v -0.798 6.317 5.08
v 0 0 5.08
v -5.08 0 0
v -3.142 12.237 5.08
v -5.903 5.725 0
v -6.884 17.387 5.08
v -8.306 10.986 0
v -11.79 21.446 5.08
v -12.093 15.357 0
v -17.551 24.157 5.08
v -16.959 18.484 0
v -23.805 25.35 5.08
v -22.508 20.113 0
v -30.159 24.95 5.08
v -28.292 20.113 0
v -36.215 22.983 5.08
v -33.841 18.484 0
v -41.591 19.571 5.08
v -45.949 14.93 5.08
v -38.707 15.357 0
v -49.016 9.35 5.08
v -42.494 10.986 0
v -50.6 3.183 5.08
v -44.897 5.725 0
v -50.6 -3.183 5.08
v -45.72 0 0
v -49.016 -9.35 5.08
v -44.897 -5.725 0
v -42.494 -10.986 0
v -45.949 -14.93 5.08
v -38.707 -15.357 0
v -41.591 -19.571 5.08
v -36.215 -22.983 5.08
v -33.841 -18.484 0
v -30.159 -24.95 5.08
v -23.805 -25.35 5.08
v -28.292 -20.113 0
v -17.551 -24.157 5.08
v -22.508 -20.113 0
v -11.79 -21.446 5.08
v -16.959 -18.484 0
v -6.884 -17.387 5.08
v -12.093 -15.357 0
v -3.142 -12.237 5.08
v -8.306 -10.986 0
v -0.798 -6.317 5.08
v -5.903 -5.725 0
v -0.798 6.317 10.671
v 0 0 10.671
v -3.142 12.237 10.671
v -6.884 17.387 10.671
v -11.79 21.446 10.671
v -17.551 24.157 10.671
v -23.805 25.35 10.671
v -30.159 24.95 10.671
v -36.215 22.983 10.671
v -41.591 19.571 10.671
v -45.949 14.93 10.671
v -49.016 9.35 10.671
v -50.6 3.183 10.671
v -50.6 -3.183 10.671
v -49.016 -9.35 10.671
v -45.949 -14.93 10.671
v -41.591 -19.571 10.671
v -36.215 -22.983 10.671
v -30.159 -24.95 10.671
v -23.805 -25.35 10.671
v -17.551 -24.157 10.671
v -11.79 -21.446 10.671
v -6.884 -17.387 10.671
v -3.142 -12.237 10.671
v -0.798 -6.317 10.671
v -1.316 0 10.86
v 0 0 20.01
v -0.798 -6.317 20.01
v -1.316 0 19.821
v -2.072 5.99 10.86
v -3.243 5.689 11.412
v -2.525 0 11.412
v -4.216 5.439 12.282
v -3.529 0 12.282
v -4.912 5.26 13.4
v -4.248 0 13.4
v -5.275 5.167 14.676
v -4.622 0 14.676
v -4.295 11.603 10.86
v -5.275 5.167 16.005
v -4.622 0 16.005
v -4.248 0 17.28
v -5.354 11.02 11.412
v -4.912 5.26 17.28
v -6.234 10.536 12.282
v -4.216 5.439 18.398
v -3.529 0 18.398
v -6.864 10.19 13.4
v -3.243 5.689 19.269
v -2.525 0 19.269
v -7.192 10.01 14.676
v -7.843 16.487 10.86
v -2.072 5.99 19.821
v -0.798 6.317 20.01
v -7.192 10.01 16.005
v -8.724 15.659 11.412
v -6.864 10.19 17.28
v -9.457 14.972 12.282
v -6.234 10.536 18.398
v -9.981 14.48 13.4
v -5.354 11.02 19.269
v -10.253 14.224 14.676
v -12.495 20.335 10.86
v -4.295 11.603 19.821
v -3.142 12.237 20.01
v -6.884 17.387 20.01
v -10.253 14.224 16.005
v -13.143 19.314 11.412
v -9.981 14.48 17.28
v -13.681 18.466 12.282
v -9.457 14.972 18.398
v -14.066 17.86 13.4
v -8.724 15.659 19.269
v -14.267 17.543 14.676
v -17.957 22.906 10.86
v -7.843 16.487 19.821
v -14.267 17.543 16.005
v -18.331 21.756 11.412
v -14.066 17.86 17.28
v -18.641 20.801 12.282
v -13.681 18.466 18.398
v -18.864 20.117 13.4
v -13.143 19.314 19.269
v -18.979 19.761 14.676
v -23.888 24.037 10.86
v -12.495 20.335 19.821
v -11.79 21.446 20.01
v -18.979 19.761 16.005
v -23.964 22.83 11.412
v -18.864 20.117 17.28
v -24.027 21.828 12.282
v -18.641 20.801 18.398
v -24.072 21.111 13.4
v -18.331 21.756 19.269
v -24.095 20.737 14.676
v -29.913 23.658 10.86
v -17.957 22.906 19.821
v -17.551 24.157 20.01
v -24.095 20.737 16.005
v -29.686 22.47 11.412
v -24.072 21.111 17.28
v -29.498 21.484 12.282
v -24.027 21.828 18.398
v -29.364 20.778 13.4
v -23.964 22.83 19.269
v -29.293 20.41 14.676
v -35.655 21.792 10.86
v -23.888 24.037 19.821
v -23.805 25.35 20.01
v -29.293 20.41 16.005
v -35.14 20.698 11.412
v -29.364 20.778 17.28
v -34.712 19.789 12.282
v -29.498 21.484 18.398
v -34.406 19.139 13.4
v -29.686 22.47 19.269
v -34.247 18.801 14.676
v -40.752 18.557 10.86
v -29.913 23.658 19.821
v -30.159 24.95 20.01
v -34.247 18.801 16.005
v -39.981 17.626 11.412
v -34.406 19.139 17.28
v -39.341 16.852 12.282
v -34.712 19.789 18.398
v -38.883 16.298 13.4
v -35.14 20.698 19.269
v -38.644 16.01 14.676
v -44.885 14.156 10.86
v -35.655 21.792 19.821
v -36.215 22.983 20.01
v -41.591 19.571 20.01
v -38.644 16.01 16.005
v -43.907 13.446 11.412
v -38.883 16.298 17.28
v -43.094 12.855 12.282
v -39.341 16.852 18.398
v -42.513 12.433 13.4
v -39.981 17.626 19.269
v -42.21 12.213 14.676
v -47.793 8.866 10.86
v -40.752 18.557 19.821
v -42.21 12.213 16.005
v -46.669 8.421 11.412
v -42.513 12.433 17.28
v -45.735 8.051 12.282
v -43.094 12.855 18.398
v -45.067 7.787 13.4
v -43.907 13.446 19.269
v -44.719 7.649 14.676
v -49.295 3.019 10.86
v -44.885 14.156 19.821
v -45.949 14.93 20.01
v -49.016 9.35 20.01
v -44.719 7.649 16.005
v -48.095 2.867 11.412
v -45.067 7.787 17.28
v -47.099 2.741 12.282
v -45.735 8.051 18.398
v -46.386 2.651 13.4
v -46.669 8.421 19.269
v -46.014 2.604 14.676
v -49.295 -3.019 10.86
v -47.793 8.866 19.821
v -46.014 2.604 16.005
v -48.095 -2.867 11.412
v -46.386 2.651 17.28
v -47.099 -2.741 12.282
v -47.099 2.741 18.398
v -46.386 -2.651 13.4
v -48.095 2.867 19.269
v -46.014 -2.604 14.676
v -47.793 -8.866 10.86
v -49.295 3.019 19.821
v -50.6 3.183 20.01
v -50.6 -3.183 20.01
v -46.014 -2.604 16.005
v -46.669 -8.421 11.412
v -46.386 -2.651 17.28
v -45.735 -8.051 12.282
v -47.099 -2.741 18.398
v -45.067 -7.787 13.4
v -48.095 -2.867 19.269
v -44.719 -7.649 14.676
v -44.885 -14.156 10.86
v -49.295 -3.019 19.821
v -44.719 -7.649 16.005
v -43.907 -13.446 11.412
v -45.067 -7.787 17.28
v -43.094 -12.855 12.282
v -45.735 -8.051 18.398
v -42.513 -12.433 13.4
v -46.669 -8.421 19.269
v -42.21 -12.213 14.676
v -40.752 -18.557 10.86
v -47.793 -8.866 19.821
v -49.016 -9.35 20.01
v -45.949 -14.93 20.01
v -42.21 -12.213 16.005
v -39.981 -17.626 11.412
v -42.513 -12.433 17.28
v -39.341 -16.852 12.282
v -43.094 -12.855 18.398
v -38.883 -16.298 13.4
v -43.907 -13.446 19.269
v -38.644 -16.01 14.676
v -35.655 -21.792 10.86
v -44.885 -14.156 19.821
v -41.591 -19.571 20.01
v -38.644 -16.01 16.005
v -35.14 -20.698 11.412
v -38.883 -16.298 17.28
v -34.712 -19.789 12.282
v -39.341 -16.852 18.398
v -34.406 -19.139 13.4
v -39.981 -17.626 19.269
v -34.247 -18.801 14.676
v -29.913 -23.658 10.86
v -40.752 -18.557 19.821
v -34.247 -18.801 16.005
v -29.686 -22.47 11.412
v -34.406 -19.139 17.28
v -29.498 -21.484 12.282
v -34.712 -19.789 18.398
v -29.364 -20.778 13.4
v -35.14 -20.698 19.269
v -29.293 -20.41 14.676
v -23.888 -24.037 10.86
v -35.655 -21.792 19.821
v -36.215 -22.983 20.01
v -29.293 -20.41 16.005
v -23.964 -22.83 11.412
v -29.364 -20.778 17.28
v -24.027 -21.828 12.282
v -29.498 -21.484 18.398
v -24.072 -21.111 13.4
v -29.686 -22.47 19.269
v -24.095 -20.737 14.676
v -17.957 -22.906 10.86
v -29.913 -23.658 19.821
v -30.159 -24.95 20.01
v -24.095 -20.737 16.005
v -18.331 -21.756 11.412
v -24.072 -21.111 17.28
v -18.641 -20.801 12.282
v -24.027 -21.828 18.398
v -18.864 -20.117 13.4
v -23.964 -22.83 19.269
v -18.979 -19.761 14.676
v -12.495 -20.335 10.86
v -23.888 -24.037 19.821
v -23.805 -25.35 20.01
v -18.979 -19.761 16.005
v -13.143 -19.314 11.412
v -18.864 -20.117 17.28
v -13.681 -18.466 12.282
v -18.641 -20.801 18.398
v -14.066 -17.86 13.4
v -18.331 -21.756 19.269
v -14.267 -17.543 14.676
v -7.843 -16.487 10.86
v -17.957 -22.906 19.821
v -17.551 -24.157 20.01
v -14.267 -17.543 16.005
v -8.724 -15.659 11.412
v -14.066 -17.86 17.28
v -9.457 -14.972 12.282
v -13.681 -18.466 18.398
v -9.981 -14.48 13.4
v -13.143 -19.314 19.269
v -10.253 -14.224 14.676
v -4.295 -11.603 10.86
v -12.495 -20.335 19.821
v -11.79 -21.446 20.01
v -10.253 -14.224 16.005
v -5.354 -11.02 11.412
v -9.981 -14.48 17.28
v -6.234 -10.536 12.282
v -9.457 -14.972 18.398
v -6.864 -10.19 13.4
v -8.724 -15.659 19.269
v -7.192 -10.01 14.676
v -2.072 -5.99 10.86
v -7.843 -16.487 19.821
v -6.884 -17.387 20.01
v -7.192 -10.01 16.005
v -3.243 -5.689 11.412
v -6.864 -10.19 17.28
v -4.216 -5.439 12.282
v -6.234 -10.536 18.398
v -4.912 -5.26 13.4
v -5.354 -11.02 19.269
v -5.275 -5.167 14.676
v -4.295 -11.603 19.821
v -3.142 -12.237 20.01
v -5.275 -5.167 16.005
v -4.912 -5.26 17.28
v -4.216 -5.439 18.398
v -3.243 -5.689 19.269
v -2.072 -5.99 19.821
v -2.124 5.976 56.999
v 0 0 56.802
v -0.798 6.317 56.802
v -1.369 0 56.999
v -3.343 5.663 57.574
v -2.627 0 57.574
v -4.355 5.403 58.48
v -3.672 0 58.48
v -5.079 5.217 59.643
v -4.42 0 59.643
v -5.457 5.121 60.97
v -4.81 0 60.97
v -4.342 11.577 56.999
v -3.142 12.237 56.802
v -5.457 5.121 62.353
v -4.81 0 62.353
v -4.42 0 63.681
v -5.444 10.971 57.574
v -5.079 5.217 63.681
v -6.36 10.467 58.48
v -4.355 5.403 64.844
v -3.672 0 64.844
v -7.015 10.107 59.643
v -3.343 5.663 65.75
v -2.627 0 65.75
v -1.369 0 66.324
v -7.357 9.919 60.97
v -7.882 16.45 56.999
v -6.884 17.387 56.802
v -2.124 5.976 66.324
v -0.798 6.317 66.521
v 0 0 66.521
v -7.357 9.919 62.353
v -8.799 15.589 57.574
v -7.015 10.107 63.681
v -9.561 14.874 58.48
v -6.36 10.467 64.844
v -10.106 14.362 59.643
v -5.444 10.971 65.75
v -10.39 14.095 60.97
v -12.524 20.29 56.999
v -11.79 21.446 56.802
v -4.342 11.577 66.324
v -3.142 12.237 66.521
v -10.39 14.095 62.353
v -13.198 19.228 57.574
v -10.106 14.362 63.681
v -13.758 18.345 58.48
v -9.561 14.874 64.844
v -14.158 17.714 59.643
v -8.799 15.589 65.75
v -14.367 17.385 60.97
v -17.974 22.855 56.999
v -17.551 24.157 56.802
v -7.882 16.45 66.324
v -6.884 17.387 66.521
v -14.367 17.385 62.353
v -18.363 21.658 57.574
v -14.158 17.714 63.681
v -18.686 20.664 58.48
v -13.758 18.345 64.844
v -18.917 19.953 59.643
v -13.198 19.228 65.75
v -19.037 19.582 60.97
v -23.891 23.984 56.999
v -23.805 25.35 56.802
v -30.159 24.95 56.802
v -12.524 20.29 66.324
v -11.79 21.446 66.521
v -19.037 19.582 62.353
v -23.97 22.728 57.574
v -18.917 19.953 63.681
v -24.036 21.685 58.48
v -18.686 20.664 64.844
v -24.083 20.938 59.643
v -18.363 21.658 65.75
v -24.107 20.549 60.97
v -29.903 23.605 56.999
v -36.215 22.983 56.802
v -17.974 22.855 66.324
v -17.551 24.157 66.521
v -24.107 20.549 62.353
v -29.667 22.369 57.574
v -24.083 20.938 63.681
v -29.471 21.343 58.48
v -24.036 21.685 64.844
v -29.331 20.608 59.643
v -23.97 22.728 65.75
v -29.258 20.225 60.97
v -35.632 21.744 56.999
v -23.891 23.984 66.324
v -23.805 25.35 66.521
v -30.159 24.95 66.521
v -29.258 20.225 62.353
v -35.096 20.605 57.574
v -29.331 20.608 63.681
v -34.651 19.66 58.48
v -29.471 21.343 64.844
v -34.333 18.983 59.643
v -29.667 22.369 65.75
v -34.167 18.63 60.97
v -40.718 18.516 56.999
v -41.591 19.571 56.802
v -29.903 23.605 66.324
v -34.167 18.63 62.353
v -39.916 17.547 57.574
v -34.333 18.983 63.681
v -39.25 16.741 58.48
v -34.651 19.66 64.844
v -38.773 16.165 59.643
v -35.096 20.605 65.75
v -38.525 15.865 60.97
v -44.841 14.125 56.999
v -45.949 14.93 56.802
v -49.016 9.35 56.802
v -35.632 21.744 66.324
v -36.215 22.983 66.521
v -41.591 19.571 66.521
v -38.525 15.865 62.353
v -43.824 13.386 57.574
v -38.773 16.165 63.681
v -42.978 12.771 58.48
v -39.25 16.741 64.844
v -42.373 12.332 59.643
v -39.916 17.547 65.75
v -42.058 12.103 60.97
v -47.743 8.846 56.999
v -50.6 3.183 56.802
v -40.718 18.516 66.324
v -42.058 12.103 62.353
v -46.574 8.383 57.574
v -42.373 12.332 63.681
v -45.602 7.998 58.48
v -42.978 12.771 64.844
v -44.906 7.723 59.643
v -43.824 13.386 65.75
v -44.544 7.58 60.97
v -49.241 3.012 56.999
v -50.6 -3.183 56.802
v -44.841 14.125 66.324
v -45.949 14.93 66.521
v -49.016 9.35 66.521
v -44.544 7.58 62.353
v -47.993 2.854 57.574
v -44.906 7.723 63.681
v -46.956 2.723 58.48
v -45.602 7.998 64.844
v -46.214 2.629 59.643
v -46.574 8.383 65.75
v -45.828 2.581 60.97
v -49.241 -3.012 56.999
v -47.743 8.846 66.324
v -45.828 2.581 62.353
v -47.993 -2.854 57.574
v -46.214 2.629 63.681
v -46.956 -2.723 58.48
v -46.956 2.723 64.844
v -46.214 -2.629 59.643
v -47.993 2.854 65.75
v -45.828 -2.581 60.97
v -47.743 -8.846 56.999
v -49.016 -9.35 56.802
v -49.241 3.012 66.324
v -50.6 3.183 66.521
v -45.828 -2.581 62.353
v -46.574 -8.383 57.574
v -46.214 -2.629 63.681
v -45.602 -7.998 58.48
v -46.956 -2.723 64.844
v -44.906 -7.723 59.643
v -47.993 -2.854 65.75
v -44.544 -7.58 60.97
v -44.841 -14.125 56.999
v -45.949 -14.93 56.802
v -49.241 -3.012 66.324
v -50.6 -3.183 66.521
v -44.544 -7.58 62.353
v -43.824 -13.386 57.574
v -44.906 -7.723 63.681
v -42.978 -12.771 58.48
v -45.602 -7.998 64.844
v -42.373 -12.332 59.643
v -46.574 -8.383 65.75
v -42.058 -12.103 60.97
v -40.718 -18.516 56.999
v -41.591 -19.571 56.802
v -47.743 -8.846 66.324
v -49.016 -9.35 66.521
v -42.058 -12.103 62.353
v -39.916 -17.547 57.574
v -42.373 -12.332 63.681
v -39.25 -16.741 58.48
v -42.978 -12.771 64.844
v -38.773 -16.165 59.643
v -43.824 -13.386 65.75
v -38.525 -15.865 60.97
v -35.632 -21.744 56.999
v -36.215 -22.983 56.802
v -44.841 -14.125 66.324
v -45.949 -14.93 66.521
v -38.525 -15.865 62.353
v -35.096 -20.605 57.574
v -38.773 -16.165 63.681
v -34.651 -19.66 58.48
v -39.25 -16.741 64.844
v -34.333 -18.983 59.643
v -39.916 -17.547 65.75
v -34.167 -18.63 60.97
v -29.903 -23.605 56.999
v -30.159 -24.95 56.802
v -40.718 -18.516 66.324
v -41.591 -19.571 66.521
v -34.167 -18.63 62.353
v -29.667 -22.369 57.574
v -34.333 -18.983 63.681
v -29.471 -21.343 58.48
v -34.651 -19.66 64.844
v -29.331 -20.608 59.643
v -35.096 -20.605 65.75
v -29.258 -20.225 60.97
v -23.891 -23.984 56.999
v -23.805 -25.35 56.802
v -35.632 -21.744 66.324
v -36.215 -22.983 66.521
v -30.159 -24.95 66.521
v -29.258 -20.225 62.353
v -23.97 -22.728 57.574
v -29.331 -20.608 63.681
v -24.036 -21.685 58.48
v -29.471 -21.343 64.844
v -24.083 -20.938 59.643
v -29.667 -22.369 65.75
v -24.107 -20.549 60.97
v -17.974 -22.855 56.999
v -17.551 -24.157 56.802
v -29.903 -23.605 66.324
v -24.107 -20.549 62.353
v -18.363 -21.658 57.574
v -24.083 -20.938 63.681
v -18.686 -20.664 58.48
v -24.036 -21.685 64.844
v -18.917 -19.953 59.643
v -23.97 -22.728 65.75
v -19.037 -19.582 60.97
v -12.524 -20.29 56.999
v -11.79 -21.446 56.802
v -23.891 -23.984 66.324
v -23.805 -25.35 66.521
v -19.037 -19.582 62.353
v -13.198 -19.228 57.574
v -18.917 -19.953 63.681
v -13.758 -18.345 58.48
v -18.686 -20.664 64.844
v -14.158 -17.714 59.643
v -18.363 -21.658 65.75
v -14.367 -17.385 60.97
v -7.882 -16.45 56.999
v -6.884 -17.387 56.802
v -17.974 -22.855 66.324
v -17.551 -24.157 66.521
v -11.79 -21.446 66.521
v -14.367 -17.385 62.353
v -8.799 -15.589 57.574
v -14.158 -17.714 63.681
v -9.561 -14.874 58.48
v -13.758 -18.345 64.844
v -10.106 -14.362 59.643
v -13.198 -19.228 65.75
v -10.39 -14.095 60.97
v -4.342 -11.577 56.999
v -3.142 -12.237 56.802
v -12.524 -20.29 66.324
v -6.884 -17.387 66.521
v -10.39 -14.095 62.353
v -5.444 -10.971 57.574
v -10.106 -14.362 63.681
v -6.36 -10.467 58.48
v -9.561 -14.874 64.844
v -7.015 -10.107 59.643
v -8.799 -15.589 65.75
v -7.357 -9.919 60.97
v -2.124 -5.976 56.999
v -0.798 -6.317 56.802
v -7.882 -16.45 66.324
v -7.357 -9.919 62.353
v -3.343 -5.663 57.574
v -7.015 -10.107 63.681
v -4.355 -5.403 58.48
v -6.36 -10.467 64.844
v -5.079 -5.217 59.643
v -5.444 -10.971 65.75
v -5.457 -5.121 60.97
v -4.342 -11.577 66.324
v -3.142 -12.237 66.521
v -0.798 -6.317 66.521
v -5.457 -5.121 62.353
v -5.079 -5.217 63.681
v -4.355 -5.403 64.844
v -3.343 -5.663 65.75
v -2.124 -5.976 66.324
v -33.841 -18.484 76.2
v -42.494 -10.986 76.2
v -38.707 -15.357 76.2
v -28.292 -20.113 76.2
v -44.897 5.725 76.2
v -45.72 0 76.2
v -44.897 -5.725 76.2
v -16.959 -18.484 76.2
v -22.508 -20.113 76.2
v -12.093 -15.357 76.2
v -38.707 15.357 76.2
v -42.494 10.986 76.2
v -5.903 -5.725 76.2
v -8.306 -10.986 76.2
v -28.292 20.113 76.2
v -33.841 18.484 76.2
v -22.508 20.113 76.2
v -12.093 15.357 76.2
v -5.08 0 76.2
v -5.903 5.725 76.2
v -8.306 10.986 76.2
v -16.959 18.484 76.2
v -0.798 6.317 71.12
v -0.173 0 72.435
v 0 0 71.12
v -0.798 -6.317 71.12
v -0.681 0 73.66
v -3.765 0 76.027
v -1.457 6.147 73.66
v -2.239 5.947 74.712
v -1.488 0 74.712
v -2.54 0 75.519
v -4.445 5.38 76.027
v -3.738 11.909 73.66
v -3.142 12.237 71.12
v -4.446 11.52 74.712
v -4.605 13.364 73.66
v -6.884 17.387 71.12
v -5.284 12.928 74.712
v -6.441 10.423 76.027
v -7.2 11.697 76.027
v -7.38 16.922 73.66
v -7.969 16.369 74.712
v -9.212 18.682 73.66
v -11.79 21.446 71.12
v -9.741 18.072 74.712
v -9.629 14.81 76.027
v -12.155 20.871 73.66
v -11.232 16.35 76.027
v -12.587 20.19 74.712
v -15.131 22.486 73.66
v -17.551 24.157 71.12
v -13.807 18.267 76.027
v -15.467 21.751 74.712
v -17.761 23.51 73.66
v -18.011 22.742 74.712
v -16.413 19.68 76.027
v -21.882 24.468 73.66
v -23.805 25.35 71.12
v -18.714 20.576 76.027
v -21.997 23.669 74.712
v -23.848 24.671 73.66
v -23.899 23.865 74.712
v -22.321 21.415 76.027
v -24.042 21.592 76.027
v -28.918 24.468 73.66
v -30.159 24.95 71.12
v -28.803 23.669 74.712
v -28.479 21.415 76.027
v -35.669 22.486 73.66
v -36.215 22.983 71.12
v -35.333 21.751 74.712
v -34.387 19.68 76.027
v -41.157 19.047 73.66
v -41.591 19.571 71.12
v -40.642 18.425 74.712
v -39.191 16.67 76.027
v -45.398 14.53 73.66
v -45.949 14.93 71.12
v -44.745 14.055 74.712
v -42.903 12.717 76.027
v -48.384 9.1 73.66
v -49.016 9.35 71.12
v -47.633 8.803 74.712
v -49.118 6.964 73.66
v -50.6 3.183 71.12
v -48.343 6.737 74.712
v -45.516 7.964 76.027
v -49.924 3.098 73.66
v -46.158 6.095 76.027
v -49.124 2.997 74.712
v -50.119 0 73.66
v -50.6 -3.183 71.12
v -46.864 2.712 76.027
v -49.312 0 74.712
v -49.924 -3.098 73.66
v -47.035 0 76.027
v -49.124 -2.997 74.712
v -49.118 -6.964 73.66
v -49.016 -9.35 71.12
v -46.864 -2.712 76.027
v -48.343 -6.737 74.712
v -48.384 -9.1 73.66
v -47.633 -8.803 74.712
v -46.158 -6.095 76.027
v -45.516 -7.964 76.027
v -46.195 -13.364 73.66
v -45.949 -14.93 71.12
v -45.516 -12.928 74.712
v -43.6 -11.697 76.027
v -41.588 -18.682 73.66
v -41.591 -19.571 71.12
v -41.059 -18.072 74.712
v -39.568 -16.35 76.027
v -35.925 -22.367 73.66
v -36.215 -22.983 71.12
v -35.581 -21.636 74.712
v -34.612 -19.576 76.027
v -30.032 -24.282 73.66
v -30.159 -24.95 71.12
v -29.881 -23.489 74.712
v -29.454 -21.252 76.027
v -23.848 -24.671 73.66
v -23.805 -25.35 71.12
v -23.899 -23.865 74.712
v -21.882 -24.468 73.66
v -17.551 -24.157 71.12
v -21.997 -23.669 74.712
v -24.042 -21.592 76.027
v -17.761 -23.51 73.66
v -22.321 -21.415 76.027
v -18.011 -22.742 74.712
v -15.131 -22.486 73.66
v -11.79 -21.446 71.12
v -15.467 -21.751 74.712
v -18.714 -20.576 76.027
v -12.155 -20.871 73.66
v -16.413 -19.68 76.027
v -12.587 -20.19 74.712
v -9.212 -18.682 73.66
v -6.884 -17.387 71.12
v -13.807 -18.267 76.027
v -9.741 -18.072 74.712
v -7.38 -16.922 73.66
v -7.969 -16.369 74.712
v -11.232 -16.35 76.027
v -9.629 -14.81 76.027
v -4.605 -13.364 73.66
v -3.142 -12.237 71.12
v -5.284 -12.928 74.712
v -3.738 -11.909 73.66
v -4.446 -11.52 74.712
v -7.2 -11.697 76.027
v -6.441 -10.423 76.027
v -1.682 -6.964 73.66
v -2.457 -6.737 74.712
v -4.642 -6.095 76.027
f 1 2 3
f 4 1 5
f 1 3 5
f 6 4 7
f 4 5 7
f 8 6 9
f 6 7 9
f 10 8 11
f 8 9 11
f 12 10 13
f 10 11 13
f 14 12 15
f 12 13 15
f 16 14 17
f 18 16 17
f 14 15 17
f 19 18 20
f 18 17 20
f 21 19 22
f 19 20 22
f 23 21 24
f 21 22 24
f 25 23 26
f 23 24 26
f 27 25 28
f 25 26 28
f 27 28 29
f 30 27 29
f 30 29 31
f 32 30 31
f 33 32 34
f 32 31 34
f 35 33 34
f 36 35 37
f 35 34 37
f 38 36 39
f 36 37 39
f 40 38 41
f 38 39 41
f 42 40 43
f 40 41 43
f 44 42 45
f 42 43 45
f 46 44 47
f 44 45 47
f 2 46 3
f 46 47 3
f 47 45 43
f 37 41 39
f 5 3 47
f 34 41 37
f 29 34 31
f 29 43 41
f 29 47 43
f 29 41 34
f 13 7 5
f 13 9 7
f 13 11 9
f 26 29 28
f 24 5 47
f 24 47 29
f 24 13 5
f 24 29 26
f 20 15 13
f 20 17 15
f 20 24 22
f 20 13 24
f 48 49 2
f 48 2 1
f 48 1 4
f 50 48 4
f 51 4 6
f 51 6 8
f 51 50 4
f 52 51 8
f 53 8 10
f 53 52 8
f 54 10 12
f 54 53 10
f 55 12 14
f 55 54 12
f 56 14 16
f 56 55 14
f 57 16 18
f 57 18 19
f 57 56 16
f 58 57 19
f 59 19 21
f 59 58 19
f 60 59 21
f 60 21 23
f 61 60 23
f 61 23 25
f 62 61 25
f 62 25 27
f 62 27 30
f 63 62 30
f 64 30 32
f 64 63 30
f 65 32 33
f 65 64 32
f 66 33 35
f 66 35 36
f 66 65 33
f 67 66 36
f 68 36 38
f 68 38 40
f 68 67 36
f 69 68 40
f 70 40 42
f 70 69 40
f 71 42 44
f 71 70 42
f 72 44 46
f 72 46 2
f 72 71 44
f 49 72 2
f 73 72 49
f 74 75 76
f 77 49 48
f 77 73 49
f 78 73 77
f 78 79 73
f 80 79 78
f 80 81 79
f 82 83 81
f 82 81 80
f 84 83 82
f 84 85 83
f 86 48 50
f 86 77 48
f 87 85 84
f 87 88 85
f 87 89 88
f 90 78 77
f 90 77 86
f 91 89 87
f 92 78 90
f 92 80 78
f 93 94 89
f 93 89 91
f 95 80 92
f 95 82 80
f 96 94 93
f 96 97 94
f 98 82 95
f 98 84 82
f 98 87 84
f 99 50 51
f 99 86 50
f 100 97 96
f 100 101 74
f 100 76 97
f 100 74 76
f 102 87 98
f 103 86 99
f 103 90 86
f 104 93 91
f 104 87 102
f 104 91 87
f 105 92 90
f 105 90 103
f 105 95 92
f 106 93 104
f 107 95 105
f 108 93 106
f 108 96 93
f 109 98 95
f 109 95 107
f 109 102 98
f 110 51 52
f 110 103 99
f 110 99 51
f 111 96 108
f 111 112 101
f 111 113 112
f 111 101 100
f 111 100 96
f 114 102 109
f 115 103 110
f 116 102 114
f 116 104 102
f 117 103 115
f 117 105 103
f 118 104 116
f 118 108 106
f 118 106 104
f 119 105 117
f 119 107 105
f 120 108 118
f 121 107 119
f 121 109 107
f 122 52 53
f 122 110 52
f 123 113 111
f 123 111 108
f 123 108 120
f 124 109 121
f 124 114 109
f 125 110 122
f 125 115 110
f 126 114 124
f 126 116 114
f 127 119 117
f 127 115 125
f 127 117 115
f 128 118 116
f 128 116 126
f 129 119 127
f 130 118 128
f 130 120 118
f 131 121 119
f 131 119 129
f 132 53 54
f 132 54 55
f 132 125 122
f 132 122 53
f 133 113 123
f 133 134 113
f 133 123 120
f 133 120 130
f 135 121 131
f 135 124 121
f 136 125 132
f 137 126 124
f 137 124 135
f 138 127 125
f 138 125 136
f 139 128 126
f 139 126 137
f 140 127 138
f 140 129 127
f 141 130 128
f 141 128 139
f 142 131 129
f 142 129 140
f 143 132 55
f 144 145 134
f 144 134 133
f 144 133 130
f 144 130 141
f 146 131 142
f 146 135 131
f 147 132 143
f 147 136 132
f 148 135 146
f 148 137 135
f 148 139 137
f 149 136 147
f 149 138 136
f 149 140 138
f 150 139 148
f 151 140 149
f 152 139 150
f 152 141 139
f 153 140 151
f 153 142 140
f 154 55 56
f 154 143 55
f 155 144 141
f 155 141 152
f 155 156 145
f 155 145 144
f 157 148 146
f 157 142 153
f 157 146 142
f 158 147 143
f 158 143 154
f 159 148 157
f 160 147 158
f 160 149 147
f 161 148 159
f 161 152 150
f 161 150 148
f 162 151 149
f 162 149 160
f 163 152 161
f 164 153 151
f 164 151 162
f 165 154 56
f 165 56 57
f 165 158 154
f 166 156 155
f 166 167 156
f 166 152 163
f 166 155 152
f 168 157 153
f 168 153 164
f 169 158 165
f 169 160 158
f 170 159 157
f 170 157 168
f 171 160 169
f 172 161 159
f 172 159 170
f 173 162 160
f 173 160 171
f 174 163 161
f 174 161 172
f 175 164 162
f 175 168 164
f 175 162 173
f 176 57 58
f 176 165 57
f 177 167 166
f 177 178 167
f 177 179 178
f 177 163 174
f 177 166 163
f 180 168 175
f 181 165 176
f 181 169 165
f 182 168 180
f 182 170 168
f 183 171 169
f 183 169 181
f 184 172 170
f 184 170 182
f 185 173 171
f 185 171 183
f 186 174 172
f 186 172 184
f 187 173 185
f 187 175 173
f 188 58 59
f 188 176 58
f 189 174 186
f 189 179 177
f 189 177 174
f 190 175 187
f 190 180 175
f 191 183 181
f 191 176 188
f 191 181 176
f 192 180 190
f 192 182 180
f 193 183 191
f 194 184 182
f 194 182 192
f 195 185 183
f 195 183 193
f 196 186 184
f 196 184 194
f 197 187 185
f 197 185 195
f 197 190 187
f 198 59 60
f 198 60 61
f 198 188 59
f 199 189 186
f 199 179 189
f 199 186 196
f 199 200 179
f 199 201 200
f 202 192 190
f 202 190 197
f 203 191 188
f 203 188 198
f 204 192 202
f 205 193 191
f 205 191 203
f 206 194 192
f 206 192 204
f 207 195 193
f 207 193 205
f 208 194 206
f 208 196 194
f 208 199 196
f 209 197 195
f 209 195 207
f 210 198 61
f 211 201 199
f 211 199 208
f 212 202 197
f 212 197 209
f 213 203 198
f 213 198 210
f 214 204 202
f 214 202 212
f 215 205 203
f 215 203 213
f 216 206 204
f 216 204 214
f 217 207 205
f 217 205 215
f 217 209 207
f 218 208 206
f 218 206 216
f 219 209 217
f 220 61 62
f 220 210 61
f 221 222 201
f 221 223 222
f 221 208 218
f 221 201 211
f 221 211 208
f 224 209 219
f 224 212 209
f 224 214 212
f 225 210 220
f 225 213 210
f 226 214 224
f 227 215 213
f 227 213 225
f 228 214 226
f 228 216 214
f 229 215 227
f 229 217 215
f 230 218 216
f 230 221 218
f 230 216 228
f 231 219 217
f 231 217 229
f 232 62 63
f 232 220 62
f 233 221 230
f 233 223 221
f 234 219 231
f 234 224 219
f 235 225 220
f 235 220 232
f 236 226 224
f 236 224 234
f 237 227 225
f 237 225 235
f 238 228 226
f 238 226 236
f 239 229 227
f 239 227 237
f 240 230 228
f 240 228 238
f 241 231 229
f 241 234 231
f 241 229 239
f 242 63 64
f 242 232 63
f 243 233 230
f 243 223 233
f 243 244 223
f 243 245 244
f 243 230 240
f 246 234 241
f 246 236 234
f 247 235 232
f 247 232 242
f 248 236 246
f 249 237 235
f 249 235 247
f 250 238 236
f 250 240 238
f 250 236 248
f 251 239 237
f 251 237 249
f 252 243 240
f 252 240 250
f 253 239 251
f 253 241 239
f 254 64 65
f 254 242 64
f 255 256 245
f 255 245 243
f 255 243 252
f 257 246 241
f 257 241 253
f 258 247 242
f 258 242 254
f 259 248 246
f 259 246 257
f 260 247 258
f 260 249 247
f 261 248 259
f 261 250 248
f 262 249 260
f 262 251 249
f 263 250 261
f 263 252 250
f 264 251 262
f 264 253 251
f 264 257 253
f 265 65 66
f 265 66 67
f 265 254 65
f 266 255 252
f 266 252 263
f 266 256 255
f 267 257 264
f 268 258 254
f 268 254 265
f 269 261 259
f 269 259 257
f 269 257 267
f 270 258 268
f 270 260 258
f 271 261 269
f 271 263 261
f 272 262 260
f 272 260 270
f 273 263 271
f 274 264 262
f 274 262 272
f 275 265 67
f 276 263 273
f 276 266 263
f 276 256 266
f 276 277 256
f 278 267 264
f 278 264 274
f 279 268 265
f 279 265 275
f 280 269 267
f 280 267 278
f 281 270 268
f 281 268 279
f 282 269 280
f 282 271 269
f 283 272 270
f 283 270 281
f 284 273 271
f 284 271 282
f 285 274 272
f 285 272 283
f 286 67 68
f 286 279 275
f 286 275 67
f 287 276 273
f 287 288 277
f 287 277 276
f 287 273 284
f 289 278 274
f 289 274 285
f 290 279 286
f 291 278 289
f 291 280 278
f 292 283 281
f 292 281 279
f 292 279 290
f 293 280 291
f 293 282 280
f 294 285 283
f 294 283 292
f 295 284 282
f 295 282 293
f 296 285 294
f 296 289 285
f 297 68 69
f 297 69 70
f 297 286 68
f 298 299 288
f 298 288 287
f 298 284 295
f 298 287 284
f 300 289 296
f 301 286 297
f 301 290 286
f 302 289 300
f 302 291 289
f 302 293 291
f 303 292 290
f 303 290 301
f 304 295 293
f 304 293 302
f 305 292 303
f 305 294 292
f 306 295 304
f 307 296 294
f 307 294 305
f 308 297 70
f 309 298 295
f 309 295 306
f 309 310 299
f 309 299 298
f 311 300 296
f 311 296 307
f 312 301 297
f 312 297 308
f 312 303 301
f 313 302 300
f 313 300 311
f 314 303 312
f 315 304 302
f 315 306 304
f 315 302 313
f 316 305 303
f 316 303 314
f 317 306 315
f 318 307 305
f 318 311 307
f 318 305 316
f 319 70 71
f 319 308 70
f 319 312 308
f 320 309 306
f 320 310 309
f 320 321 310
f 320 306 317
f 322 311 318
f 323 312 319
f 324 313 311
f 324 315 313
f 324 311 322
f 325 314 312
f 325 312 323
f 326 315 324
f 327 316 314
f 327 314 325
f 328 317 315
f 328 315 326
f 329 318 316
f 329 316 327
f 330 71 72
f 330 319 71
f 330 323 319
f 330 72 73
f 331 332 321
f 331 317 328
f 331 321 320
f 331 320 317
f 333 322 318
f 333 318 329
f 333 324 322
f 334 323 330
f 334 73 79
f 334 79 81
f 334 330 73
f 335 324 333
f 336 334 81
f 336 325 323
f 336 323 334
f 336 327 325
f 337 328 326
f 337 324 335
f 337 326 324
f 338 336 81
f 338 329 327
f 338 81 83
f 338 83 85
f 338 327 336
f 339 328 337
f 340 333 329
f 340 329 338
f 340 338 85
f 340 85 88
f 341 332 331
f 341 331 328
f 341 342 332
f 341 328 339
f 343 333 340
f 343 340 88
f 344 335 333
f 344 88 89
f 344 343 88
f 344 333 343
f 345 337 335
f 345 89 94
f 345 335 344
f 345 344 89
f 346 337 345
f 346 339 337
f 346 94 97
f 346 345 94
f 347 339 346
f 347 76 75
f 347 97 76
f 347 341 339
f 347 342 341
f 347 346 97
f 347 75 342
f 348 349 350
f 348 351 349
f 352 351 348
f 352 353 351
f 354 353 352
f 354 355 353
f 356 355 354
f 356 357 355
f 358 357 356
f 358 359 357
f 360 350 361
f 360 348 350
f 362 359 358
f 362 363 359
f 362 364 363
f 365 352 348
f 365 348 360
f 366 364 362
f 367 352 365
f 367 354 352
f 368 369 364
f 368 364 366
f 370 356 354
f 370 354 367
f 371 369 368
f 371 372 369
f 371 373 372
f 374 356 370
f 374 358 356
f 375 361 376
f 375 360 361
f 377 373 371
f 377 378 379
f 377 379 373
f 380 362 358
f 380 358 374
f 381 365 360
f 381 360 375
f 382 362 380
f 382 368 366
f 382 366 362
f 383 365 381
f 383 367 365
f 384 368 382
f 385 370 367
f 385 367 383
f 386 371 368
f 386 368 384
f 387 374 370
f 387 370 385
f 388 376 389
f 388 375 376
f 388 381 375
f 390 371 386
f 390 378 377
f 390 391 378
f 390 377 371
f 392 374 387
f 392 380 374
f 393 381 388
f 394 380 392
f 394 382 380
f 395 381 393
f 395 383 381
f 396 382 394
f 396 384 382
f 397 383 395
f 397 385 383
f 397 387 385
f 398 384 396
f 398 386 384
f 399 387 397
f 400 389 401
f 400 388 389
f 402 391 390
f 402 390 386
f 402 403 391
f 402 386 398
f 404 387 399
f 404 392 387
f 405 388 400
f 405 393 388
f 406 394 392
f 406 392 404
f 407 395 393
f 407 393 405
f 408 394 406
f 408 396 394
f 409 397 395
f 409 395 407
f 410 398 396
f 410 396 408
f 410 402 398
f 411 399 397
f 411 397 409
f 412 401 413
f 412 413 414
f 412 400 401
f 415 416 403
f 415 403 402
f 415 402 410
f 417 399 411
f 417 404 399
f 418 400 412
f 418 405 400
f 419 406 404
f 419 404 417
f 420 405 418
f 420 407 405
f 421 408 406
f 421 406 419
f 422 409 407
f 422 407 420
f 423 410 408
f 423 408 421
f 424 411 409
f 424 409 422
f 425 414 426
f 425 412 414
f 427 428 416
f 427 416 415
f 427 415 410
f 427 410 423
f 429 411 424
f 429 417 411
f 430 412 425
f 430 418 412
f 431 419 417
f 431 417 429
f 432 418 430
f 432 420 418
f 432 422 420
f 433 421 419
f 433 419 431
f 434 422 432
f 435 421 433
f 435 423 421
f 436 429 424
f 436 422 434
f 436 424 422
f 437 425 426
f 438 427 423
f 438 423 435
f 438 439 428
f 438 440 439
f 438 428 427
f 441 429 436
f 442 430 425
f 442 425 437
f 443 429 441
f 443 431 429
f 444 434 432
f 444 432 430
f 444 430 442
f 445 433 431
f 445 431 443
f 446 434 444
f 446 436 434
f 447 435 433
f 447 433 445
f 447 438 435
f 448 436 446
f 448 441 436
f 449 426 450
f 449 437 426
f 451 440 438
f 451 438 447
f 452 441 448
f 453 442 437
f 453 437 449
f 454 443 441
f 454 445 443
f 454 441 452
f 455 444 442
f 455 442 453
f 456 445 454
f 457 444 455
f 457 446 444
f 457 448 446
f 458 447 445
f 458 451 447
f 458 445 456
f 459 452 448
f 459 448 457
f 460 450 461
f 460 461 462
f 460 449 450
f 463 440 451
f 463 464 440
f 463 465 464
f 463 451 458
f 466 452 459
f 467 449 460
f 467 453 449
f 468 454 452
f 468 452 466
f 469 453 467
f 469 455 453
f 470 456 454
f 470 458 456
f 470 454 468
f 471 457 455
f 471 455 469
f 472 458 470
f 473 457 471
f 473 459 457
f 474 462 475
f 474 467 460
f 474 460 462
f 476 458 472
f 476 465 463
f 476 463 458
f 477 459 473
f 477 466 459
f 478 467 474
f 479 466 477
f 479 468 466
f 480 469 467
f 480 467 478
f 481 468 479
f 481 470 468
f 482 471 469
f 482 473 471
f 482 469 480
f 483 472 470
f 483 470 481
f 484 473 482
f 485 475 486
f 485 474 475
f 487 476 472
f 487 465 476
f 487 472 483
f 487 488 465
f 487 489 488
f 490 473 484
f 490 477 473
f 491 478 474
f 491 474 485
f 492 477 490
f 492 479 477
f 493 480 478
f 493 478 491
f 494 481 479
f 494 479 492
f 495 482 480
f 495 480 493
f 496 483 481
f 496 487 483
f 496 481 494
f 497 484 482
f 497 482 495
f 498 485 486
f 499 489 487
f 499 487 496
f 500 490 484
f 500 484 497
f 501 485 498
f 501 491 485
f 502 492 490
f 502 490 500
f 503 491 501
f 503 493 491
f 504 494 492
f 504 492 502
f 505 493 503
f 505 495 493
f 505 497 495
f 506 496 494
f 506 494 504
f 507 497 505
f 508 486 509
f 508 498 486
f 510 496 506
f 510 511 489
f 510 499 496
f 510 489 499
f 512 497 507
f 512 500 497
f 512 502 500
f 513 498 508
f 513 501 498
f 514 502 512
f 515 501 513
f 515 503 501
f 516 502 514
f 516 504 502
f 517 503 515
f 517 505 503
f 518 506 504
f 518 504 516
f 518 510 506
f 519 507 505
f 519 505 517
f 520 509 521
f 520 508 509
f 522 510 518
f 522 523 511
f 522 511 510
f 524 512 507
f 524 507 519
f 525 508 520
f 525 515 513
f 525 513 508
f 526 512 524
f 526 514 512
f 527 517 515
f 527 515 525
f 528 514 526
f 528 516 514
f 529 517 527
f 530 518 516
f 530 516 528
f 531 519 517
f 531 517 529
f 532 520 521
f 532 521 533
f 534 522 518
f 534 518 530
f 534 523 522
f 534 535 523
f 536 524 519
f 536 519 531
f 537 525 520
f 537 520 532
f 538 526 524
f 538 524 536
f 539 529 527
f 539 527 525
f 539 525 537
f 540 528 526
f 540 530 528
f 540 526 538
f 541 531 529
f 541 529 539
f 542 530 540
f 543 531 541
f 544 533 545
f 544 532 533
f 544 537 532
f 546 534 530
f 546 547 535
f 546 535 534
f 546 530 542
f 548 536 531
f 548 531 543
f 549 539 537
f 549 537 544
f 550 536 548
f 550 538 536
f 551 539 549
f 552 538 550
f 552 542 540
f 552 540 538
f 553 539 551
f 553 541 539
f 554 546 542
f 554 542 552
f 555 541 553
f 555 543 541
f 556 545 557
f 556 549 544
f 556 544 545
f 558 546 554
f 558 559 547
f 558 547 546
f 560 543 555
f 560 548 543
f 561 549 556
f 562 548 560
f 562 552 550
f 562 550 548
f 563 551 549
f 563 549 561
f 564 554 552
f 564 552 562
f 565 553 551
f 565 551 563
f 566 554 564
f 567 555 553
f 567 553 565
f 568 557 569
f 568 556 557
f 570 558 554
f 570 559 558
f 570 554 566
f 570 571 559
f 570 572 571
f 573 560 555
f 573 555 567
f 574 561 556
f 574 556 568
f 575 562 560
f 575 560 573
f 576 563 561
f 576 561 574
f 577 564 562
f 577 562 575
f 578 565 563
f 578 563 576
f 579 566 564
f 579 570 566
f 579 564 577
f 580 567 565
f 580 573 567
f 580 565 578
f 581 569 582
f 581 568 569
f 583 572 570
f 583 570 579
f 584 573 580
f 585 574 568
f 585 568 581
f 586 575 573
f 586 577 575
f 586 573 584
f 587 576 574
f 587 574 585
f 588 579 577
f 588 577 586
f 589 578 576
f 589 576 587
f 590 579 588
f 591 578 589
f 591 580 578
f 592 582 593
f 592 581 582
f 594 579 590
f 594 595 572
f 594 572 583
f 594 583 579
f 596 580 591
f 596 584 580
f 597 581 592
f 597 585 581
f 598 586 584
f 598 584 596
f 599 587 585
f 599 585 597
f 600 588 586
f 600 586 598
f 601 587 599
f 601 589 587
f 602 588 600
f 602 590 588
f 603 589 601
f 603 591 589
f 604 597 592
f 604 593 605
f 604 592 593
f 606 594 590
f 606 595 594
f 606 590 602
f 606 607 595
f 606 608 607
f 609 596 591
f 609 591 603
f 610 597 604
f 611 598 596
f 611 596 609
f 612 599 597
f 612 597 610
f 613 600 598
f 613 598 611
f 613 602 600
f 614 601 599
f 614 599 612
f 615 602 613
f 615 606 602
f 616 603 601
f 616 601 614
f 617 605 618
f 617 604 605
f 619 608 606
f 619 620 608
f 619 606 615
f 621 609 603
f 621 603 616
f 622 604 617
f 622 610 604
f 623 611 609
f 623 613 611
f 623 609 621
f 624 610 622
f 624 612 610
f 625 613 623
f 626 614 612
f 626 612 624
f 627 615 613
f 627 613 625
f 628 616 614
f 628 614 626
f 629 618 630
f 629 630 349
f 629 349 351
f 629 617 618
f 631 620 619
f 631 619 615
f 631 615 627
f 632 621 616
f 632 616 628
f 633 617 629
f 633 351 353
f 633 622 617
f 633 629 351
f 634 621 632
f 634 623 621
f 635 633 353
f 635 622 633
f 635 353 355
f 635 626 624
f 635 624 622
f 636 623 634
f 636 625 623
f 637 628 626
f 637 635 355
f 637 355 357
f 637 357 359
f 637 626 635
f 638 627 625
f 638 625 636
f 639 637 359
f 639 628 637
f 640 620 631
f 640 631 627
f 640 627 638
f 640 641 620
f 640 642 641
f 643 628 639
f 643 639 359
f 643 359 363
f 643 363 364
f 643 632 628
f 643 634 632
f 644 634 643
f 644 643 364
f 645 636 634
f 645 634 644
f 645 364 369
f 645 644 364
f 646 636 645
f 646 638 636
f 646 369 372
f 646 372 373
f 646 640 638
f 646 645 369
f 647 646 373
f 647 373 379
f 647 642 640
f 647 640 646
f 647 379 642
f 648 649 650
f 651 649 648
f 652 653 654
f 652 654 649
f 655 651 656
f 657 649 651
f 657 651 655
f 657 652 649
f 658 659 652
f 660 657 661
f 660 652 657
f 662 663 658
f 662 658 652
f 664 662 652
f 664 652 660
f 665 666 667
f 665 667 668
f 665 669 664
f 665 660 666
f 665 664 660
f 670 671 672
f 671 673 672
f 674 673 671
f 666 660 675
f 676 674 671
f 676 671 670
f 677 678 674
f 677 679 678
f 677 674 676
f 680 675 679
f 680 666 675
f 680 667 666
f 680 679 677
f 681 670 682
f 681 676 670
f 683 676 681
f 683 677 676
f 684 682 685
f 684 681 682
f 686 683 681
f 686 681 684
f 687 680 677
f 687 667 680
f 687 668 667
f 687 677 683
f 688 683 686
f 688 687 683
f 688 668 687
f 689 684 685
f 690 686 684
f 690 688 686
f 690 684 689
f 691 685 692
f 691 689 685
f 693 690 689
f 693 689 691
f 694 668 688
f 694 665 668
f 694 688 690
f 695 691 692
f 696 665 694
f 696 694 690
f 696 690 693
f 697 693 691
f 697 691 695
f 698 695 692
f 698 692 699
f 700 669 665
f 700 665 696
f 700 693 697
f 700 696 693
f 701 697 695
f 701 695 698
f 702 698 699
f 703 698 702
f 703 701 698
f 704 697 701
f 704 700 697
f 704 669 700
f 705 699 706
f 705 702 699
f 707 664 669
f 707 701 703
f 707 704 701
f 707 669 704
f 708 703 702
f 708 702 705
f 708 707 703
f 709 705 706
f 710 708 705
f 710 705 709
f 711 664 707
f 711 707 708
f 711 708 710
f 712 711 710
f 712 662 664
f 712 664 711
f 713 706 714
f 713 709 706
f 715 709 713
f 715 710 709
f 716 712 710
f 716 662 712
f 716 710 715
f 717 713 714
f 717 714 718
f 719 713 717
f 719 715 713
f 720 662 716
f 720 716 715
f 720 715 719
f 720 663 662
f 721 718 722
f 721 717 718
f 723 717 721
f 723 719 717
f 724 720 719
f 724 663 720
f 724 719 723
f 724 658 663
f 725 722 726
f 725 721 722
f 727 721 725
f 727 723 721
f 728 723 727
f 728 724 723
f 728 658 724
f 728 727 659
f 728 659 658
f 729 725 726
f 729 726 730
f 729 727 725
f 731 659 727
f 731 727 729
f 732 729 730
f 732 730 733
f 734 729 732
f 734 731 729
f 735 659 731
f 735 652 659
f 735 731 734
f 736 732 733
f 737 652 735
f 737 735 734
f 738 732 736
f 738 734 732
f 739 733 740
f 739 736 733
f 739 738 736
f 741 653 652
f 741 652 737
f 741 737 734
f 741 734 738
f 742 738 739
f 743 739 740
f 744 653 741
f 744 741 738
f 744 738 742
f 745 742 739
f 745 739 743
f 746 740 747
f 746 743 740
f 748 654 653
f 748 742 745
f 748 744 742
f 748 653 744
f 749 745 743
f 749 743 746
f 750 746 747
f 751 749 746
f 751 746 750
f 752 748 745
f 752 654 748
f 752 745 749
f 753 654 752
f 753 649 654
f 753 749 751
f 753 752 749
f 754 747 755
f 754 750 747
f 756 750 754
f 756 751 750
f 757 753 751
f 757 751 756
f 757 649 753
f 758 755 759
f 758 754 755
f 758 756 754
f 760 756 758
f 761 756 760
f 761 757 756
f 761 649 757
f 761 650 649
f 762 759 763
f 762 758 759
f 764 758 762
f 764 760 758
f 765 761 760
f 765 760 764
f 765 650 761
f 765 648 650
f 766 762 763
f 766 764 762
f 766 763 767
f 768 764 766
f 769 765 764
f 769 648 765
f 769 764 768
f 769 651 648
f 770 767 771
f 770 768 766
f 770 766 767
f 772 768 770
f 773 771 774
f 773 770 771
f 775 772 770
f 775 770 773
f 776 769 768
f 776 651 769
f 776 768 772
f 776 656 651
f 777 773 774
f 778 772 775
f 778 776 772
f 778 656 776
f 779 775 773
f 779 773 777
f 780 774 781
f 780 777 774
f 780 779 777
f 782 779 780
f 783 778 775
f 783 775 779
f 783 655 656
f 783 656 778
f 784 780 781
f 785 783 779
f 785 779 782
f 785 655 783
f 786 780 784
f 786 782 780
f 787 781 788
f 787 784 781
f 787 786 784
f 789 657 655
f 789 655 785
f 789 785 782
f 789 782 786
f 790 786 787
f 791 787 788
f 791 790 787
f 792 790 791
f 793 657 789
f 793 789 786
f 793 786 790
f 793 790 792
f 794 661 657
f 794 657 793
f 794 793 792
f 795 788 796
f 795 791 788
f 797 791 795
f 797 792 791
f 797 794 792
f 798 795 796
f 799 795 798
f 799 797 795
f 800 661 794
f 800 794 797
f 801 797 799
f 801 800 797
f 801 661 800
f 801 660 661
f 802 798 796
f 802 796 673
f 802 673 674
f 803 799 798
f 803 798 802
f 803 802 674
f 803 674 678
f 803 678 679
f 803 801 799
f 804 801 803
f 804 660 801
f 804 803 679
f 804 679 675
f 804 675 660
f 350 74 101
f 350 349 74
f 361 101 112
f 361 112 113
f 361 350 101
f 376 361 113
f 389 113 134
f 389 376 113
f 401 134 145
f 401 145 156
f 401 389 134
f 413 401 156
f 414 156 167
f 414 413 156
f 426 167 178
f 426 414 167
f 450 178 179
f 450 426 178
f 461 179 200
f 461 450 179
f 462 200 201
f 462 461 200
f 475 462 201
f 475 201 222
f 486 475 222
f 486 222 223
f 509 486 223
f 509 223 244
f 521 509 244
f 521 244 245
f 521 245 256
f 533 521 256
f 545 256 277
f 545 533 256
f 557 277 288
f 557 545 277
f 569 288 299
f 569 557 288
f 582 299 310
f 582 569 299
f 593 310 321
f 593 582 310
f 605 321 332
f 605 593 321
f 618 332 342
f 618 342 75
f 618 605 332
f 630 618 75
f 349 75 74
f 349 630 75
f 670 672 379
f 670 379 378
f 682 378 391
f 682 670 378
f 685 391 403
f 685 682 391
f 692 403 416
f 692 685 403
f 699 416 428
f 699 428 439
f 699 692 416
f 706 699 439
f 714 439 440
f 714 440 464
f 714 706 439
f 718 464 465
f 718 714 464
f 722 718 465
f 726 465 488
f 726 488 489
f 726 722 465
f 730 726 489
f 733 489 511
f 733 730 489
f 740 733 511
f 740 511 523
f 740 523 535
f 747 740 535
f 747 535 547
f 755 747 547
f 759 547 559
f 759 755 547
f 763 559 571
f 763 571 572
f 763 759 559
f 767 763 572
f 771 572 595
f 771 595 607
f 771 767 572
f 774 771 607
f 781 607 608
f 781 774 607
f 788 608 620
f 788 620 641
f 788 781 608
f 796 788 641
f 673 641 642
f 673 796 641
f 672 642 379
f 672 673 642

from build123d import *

# Parameters (mm, degrees)
F2_R    = 5.08
F3_SIZE = 5.08


with BuildPart() as f1:
    # F0 (on Front) → F1 (revolve)
    with BuildSketch(Plane.XZ):
        with BuildLine():
            Line((-25.4, 0), (0, 0))
            Line((0, 0), (0, 10.6707542909))
            ThreePointArc((0, 10.6707542909), (-4.6695087331, 15.340263024), (0, 20.0097717571))
            Line((0, 20.0097717571), (0, 56.8024416143))
            ThreePointArc((0, 56.8024416143), (-4.8593978709, 61.6618394852), (0, 66.521237356))
            Line((0, 66.521237356), (0, 76.2))
            Line((0, 76.2), (-25.4, 76.2))
            Line((-25.4, 76.2), (-25.4, 0))
        make_face()
    revolve(axis=Axis((-25.4, 0, 38.1), (0, 0, 1)))

    # F2
    f2_edges = [f1.edges().sort_by_distance(p)[0] for p in [
        (-50.8, 0, 76.2),
    ]]
    fillet(f2_edges, radius=F2_R)

    # F3
    f3_edges = [f1.edges().sort_by_distance(p)[0] for p in [
        (-50.8, 0, 0),
    ]]
    chamfer(f3_edges, length=F3_SIZE)


solid = f1.part
